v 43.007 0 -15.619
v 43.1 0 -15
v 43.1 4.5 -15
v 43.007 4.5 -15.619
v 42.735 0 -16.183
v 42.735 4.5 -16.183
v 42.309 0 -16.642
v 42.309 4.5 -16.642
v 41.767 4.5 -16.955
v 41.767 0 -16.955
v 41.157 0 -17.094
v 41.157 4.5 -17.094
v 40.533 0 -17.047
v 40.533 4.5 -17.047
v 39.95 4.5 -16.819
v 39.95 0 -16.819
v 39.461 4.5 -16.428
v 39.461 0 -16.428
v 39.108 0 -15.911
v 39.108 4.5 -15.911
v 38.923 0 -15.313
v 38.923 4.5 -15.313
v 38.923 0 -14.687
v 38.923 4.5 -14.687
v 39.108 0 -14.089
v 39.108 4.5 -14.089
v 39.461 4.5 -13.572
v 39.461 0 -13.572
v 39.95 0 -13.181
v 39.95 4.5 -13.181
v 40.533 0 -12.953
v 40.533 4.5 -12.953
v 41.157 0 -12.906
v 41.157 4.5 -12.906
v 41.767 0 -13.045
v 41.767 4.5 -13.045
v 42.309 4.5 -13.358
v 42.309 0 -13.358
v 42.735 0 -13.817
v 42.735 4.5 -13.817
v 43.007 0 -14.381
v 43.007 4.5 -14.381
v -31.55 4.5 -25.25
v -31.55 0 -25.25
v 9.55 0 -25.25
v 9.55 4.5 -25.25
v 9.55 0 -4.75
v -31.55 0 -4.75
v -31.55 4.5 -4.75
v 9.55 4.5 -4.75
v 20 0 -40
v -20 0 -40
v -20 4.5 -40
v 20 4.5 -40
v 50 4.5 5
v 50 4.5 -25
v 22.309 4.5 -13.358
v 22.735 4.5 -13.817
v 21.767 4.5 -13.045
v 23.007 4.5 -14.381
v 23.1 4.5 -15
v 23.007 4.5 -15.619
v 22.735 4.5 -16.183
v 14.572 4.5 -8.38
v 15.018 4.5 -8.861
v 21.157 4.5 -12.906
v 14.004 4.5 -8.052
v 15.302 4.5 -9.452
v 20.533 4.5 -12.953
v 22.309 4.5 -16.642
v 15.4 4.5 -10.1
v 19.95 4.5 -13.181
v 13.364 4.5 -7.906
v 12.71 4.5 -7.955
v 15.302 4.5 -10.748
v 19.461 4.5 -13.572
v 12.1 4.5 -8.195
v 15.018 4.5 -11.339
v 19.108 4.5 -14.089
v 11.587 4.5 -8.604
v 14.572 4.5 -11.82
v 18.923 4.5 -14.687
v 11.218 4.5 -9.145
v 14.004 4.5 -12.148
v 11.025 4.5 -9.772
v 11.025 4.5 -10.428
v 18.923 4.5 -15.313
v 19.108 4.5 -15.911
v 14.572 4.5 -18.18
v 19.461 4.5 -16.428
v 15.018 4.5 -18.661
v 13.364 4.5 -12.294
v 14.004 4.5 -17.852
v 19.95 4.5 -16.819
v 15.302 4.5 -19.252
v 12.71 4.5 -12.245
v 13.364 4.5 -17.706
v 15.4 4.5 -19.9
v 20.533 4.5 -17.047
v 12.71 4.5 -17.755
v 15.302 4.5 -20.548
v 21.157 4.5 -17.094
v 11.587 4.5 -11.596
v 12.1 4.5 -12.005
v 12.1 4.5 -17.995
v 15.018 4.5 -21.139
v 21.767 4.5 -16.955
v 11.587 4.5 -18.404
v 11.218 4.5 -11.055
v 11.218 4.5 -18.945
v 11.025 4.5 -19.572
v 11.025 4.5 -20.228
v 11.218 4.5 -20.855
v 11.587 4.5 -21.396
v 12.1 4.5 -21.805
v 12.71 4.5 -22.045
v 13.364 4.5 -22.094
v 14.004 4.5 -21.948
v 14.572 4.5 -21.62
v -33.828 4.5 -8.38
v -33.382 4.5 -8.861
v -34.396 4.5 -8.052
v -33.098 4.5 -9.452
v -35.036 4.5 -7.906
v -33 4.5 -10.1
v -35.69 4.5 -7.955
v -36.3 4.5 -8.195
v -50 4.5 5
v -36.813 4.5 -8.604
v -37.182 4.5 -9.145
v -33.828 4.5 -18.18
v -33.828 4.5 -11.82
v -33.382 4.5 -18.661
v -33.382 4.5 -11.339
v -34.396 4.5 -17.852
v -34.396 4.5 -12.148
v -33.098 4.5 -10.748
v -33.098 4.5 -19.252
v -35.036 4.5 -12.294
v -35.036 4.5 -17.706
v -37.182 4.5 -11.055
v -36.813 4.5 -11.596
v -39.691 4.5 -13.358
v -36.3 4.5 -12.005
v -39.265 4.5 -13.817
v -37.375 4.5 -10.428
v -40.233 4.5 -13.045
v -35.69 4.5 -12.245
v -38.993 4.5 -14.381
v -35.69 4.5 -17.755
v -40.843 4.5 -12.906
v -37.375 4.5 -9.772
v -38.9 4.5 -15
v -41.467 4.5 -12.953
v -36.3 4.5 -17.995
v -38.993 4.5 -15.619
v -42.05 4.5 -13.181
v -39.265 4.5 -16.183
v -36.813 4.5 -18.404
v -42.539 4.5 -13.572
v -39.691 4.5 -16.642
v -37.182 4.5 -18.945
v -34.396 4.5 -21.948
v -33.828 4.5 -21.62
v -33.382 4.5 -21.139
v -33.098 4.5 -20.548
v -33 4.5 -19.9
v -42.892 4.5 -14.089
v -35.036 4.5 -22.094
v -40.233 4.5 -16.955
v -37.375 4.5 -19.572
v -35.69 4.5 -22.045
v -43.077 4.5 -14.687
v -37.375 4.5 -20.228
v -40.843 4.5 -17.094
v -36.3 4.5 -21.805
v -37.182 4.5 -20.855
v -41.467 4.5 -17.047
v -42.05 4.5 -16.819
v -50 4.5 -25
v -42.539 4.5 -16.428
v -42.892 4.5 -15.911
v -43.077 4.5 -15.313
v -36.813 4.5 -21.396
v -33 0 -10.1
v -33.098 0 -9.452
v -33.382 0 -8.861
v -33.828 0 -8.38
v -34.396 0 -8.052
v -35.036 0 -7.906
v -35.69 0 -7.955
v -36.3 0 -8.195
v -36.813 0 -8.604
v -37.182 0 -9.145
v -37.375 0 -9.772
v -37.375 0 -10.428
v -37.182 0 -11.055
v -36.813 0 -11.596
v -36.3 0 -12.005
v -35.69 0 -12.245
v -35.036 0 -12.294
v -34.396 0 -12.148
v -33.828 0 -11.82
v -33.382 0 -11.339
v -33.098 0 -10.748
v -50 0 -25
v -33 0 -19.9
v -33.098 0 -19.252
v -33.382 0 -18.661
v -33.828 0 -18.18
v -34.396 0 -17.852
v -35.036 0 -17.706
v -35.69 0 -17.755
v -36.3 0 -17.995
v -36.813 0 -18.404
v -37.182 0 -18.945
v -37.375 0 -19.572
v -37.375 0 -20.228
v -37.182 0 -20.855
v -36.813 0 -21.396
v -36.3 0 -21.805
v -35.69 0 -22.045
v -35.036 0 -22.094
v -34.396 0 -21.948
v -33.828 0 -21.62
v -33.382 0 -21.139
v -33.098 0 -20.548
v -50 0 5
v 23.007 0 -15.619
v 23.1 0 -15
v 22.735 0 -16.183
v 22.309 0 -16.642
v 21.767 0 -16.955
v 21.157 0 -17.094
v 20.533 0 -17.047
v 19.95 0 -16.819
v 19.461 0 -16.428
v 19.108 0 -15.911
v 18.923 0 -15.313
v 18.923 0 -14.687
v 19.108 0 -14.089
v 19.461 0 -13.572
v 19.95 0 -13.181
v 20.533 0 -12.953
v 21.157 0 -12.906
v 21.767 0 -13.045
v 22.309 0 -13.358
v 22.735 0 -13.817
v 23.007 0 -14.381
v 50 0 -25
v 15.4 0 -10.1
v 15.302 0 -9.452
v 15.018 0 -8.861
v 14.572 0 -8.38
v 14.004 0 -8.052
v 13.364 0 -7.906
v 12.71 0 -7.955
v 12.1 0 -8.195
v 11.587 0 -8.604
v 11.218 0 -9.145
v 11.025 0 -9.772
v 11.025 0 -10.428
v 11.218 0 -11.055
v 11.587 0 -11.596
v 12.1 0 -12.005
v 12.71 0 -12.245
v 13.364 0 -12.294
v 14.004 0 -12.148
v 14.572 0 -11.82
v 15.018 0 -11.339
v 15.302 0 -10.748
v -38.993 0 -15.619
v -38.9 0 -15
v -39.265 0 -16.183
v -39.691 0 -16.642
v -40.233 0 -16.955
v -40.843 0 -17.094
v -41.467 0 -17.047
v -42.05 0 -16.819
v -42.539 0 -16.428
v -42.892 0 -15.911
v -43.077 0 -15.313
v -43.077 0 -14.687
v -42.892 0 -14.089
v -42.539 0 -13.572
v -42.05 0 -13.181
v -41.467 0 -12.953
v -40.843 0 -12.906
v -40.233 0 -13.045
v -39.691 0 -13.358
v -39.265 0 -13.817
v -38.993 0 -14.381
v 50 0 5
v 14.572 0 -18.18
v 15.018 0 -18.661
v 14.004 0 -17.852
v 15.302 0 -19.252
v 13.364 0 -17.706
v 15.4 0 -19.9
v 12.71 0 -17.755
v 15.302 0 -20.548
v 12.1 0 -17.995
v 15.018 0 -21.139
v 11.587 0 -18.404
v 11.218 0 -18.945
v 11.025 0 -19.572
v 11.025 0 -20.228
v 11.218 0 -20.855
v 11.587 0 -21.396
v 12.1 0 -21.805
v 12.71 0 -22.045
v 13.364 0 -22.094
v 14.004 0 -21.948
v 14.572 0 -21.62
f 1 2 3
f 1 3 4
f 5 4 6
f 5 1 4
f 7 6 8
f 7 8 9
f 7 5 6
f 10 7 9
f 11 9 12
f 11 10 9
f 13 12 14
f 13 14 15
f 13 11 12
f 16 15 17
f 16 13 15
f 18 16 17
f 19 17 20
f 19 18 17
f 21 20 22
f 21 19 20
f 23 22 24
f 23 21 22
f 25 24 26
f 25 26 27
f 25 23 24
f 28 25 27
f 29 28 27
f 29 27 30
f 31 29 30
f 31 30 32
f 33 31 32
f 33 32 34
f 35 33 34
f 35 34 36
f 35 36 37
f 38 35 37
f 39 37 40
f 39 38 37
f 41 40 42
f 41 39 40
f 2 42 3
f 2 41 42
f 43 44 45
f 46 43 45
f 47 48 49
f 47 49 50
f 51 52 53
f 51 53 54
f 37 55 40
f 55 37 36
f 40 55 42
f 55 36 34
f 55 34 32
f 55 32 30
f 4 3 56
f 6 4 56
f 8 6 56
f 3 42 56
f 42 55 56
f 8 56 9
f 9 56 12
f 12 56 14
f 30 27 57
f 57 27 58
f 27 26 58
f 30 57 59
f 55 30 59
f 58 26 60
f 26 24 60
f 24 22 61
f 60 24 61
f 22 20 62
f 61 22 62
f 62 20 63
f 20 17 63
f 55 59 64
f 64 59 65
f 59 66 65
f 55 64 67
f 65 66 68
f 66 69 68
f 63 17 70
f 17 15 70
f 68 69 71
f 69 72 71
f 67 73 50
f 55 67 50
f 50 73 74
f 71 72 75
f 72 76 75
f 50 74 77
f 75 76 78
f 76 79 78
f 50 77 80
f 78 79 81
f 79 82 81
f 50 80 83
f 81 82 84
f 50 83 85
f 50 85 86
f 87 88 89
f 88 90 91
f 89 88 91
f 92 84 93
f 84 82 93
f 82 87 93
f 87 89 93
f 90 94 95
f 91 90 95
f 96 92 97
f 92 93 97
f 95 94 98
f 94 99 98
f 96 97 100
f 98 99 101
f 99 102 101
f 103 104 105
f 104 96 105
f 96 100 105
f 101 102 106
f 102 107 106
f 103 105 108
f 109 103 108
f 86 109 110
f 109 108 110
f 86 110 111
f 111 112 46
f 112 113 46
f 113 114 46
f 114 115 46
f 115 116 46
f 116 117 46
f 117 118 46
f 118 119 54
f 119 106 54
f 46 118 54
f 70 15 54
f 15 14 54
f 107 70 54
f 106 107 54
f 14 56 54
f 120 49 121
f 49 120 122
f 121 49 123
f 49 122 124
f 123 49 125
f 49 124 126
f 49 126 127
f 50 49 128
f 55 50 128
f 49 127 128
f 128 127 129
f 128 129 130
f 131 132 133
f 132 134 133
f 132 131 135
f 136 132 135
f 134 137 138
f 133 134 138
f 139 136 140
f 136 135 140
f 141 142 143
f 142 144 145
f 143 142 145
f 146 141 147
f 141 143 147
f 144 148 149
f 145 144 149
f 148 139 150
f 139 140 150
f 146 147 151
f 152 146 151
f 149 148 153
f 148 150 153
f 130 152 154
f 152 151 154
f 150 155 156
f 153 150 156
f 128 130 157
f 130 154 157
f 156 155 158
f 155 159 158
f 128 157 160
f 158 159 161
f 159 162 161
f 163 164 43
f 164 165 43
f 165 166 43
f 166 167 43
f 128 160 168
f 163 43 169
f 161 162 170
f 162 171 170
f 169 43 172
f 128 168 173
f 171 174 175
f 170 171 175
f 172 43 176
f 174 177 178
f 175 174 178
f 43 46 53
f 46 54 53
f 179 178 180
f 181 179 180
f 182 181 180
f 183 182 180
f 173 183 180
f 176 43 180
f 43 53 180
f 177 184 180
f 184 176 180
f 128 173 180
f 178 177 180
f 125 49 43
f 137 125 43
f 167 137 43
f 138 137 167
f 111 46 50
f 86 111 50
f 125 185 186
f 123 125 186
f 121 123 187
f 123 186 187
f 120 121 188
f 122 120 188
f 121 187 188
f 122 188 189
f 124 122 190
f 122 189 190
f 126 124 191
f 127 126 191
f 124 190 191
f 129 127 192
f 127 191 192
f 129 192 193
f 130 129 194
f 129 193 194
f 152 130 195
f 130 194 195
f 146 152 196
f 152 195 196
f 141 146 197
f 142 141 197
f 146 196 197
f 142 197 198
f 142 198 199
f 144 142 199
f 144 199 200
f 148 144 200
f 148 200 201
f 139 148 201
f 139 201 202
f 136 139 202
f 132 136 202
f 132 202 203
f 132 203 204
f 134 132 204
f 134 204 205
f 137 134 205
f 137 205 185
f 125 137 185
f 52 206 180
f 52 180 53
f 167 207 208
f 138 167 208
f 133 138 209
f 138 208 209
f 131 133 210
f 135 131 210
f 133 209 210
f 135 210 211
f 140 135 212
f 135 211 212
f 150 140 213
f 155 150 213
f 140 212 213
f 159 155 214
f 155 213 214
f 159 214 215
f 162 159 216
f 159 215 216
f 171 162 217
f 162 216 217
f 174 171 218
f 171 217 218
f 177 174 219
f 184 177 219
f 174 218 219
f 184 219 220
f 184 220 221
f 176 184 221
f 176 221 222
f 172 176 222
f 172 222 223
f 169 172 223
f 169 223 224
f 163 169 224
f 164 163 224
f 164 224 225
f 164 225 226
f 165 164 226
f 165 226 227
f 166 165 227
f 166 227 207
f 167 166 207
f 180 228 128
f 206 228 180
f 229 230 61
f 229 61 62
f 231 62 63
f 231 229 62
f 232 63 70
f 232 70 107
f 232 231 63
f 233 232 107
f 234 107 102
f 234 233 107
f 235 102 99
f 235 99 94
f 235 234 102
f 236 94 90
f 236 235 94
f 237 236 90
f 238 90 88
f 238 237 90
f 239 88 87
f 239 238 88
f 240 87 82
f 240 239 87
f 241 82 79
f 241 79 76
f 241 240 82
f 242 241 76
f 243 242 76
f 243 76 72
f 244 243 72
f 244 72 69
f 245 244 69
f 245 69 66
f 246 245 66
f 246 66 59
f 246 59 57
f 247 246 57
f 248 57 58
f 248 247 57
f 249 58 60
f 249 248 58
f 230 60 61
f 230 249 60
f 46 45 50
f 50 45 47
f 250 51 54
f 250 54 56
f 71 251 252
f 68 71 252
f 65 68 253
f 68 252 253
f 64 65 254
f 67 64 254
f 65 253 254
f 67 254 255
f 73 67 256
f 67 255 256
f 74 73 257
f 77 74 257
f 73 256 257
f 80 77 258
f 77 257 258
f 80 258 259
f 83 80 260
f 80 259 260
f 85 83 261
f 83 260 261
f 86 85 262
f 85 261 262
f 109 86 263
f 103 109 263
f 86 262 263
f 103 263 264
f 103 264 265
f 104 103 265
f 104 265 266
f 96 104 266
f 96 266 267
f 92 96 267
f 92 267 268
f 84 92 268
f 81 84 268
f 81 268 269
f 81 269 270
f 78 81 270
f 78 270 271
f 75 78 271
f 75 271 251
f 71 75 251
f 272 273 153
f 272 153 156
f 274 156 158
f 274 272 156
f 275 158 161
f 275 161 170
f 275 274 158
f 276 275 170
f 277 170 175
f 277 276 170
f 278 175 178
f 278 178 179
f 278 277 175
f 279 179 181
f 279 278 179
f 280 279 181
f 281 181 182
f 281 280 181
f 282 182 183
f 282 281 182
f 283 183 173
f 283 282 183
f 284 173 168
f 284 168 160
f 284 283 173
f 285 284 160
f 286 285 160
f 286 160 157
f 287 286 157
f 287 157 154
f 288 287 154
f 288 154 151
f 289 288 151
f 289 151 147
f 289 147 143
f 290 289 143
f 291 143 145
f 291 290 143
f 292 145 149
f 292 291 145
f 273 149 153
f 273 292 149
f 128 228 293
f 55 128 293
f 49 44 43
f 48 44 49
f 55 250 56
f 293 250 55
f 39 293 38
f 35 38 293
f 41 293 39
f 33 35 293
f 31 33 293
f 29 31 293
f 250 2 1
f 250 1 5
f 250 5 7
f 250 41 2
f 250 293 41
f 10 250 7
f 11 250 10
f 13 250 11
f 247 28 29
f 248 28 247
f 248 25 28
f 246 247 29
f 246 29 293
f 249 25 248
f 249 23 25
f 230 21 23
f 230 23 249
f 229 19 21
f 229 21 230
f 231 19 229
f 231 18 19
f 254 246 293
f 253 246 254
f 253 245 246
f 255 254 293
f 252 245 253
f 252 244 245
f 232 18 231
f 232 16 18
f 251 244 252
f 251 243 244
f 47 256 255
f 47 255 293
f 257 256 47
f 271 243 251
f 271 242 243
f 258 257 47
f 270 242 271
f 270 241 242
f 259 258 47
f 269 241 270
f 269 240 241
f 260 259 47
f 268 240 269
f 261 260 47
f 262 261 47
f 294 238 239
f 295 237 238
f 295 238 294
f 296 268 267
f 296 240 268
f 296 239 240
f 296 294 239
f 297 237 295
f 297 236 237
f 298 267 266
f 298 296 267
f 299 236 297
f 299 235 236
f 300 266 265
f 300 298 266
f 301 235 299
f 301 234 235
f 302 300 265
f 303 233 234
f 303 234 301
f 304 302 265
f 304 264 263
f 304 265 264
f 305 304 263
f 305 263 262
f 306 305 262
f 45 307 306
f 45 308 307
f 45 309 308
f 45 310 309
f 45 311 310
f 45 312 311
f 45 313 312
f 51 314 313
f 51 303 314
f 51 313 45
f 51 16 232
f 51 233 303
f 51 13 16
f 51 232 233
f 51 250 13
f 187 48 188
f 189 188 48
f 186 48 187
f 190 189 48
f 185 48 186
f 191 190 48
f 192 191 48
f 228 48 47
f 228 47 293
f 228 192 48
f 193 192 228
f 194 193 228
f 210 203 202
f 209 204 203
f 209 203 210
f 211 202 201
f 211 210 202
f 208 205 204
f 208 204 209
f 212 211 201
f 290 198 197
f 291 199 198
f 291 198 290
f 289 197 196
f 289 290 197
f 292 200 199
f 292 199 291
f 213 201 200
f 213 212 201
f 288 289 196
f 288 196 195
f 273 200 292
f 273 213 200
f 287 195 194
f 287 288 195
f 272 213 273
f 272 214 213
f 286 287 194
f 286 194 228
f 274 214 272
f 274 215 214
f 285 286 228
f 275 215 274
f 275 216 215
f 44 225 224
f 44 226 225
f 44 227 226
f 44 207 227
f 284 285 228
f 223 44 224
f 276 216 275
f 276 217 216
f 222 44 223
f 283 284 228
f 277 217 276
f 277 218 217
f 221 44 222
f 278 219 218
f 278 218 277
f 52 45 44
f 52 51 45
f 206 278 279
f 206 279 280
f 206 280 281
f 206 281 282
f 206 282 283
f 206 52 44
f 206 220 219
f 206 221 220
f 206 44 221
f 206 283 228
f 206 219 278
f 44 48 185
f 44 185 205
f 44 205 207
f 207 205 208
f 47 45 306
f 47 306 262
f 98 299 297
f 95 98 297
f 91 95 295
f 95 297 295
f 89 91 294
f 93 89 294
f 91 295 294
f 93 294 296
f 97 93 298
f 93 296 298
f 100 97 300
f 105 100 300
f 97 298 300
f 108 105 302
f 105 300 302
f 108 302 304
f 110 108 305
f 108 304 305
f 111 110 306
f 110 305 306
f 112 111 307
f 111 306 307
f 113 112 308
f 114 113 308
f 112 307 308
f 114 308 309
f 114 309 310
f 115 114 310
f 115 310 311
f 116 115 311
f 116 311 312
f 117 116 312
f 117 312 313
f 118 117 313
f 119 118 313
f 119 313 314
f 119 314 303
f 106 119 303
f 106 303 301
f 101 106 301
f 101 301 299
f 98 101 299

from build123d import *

# Parameters (mm, degrees)
SKETCH1_R           = 2.1
BOSS_EXTRUDE1_DEPTH = 4.5
SKETCH2_R           = 2.2
SKETCH2_W           = 41.1
SKETCH2_H           = 20.5
CUT_EXTRUDE1_DEPTH  = 10
SKETCH3_W           = 100
SKETCH3_H           = 20
CUT_EXTRUDE2_DEPTH  = 10


with BuildPart() as part:
    # Sketch1 → Boss-Extrude1 (new body)
    with BuildSketch(Plane(origin=(0, 0, 0), x_dir=(1, 0, 0), z_dir=(0, 1, 0))):
        Polygon((20, 40), (50, 25), (50, -25), (-50, -25), (-50, 25), (-20, 40), align=None)
        with Locations((-41, 15)):
            Circle(SKETCH1_R, mode=Mode.SUBTRACT)
        with Locations((41, 15)):
            Circle(SKETCH1_R, mode=Mode.SUBTRACT)
        with Locations((-21, 15)):
            Circle(SKETCH1_R, mode=Mode.SUBTRACT)
        with Locations((21, 15)):
            Circle(SKETCH1_R, mode=Mode.SUBTRACT)
    extrude(amount=BOSS_EXTRUDE1_DEPTH)

    # Sketch2 → Cut-Extrude1 (cut)
    with BuildSketch(Plane.XZ):
        with Locations((13.2, -19.9)):
            Circle(SKETCH2_R)
        with Locations((13.2, -10.1)):
            Circle(SKETCH2_R)
        with Locations((-35.2, -19.9)):
            Circle(SKETCH2_R)
        with Locations((-35.2, -10.1)):
            Circle(SKETCH2_R)
        with Locations((-11, -15)):
            Rectangle(SKETCH2_W, SKETCH2_H)
    extrude(amount=-CUT_EXTRUDE1_DEPTH, mode=Mode.SUBTRACT)

    # Sketch3 → Cut-Extrude2 (cut)
    with BuildSketch(Plane.XZ):
        with Locations((0, 15)):
            Rectangle(SKETCH3_W, SKETCH3_H)
    extrude(amount=-CUT_EXTRUDE2_DEPTH, mode=Mode.SUBTRACT)


solid = part.part
